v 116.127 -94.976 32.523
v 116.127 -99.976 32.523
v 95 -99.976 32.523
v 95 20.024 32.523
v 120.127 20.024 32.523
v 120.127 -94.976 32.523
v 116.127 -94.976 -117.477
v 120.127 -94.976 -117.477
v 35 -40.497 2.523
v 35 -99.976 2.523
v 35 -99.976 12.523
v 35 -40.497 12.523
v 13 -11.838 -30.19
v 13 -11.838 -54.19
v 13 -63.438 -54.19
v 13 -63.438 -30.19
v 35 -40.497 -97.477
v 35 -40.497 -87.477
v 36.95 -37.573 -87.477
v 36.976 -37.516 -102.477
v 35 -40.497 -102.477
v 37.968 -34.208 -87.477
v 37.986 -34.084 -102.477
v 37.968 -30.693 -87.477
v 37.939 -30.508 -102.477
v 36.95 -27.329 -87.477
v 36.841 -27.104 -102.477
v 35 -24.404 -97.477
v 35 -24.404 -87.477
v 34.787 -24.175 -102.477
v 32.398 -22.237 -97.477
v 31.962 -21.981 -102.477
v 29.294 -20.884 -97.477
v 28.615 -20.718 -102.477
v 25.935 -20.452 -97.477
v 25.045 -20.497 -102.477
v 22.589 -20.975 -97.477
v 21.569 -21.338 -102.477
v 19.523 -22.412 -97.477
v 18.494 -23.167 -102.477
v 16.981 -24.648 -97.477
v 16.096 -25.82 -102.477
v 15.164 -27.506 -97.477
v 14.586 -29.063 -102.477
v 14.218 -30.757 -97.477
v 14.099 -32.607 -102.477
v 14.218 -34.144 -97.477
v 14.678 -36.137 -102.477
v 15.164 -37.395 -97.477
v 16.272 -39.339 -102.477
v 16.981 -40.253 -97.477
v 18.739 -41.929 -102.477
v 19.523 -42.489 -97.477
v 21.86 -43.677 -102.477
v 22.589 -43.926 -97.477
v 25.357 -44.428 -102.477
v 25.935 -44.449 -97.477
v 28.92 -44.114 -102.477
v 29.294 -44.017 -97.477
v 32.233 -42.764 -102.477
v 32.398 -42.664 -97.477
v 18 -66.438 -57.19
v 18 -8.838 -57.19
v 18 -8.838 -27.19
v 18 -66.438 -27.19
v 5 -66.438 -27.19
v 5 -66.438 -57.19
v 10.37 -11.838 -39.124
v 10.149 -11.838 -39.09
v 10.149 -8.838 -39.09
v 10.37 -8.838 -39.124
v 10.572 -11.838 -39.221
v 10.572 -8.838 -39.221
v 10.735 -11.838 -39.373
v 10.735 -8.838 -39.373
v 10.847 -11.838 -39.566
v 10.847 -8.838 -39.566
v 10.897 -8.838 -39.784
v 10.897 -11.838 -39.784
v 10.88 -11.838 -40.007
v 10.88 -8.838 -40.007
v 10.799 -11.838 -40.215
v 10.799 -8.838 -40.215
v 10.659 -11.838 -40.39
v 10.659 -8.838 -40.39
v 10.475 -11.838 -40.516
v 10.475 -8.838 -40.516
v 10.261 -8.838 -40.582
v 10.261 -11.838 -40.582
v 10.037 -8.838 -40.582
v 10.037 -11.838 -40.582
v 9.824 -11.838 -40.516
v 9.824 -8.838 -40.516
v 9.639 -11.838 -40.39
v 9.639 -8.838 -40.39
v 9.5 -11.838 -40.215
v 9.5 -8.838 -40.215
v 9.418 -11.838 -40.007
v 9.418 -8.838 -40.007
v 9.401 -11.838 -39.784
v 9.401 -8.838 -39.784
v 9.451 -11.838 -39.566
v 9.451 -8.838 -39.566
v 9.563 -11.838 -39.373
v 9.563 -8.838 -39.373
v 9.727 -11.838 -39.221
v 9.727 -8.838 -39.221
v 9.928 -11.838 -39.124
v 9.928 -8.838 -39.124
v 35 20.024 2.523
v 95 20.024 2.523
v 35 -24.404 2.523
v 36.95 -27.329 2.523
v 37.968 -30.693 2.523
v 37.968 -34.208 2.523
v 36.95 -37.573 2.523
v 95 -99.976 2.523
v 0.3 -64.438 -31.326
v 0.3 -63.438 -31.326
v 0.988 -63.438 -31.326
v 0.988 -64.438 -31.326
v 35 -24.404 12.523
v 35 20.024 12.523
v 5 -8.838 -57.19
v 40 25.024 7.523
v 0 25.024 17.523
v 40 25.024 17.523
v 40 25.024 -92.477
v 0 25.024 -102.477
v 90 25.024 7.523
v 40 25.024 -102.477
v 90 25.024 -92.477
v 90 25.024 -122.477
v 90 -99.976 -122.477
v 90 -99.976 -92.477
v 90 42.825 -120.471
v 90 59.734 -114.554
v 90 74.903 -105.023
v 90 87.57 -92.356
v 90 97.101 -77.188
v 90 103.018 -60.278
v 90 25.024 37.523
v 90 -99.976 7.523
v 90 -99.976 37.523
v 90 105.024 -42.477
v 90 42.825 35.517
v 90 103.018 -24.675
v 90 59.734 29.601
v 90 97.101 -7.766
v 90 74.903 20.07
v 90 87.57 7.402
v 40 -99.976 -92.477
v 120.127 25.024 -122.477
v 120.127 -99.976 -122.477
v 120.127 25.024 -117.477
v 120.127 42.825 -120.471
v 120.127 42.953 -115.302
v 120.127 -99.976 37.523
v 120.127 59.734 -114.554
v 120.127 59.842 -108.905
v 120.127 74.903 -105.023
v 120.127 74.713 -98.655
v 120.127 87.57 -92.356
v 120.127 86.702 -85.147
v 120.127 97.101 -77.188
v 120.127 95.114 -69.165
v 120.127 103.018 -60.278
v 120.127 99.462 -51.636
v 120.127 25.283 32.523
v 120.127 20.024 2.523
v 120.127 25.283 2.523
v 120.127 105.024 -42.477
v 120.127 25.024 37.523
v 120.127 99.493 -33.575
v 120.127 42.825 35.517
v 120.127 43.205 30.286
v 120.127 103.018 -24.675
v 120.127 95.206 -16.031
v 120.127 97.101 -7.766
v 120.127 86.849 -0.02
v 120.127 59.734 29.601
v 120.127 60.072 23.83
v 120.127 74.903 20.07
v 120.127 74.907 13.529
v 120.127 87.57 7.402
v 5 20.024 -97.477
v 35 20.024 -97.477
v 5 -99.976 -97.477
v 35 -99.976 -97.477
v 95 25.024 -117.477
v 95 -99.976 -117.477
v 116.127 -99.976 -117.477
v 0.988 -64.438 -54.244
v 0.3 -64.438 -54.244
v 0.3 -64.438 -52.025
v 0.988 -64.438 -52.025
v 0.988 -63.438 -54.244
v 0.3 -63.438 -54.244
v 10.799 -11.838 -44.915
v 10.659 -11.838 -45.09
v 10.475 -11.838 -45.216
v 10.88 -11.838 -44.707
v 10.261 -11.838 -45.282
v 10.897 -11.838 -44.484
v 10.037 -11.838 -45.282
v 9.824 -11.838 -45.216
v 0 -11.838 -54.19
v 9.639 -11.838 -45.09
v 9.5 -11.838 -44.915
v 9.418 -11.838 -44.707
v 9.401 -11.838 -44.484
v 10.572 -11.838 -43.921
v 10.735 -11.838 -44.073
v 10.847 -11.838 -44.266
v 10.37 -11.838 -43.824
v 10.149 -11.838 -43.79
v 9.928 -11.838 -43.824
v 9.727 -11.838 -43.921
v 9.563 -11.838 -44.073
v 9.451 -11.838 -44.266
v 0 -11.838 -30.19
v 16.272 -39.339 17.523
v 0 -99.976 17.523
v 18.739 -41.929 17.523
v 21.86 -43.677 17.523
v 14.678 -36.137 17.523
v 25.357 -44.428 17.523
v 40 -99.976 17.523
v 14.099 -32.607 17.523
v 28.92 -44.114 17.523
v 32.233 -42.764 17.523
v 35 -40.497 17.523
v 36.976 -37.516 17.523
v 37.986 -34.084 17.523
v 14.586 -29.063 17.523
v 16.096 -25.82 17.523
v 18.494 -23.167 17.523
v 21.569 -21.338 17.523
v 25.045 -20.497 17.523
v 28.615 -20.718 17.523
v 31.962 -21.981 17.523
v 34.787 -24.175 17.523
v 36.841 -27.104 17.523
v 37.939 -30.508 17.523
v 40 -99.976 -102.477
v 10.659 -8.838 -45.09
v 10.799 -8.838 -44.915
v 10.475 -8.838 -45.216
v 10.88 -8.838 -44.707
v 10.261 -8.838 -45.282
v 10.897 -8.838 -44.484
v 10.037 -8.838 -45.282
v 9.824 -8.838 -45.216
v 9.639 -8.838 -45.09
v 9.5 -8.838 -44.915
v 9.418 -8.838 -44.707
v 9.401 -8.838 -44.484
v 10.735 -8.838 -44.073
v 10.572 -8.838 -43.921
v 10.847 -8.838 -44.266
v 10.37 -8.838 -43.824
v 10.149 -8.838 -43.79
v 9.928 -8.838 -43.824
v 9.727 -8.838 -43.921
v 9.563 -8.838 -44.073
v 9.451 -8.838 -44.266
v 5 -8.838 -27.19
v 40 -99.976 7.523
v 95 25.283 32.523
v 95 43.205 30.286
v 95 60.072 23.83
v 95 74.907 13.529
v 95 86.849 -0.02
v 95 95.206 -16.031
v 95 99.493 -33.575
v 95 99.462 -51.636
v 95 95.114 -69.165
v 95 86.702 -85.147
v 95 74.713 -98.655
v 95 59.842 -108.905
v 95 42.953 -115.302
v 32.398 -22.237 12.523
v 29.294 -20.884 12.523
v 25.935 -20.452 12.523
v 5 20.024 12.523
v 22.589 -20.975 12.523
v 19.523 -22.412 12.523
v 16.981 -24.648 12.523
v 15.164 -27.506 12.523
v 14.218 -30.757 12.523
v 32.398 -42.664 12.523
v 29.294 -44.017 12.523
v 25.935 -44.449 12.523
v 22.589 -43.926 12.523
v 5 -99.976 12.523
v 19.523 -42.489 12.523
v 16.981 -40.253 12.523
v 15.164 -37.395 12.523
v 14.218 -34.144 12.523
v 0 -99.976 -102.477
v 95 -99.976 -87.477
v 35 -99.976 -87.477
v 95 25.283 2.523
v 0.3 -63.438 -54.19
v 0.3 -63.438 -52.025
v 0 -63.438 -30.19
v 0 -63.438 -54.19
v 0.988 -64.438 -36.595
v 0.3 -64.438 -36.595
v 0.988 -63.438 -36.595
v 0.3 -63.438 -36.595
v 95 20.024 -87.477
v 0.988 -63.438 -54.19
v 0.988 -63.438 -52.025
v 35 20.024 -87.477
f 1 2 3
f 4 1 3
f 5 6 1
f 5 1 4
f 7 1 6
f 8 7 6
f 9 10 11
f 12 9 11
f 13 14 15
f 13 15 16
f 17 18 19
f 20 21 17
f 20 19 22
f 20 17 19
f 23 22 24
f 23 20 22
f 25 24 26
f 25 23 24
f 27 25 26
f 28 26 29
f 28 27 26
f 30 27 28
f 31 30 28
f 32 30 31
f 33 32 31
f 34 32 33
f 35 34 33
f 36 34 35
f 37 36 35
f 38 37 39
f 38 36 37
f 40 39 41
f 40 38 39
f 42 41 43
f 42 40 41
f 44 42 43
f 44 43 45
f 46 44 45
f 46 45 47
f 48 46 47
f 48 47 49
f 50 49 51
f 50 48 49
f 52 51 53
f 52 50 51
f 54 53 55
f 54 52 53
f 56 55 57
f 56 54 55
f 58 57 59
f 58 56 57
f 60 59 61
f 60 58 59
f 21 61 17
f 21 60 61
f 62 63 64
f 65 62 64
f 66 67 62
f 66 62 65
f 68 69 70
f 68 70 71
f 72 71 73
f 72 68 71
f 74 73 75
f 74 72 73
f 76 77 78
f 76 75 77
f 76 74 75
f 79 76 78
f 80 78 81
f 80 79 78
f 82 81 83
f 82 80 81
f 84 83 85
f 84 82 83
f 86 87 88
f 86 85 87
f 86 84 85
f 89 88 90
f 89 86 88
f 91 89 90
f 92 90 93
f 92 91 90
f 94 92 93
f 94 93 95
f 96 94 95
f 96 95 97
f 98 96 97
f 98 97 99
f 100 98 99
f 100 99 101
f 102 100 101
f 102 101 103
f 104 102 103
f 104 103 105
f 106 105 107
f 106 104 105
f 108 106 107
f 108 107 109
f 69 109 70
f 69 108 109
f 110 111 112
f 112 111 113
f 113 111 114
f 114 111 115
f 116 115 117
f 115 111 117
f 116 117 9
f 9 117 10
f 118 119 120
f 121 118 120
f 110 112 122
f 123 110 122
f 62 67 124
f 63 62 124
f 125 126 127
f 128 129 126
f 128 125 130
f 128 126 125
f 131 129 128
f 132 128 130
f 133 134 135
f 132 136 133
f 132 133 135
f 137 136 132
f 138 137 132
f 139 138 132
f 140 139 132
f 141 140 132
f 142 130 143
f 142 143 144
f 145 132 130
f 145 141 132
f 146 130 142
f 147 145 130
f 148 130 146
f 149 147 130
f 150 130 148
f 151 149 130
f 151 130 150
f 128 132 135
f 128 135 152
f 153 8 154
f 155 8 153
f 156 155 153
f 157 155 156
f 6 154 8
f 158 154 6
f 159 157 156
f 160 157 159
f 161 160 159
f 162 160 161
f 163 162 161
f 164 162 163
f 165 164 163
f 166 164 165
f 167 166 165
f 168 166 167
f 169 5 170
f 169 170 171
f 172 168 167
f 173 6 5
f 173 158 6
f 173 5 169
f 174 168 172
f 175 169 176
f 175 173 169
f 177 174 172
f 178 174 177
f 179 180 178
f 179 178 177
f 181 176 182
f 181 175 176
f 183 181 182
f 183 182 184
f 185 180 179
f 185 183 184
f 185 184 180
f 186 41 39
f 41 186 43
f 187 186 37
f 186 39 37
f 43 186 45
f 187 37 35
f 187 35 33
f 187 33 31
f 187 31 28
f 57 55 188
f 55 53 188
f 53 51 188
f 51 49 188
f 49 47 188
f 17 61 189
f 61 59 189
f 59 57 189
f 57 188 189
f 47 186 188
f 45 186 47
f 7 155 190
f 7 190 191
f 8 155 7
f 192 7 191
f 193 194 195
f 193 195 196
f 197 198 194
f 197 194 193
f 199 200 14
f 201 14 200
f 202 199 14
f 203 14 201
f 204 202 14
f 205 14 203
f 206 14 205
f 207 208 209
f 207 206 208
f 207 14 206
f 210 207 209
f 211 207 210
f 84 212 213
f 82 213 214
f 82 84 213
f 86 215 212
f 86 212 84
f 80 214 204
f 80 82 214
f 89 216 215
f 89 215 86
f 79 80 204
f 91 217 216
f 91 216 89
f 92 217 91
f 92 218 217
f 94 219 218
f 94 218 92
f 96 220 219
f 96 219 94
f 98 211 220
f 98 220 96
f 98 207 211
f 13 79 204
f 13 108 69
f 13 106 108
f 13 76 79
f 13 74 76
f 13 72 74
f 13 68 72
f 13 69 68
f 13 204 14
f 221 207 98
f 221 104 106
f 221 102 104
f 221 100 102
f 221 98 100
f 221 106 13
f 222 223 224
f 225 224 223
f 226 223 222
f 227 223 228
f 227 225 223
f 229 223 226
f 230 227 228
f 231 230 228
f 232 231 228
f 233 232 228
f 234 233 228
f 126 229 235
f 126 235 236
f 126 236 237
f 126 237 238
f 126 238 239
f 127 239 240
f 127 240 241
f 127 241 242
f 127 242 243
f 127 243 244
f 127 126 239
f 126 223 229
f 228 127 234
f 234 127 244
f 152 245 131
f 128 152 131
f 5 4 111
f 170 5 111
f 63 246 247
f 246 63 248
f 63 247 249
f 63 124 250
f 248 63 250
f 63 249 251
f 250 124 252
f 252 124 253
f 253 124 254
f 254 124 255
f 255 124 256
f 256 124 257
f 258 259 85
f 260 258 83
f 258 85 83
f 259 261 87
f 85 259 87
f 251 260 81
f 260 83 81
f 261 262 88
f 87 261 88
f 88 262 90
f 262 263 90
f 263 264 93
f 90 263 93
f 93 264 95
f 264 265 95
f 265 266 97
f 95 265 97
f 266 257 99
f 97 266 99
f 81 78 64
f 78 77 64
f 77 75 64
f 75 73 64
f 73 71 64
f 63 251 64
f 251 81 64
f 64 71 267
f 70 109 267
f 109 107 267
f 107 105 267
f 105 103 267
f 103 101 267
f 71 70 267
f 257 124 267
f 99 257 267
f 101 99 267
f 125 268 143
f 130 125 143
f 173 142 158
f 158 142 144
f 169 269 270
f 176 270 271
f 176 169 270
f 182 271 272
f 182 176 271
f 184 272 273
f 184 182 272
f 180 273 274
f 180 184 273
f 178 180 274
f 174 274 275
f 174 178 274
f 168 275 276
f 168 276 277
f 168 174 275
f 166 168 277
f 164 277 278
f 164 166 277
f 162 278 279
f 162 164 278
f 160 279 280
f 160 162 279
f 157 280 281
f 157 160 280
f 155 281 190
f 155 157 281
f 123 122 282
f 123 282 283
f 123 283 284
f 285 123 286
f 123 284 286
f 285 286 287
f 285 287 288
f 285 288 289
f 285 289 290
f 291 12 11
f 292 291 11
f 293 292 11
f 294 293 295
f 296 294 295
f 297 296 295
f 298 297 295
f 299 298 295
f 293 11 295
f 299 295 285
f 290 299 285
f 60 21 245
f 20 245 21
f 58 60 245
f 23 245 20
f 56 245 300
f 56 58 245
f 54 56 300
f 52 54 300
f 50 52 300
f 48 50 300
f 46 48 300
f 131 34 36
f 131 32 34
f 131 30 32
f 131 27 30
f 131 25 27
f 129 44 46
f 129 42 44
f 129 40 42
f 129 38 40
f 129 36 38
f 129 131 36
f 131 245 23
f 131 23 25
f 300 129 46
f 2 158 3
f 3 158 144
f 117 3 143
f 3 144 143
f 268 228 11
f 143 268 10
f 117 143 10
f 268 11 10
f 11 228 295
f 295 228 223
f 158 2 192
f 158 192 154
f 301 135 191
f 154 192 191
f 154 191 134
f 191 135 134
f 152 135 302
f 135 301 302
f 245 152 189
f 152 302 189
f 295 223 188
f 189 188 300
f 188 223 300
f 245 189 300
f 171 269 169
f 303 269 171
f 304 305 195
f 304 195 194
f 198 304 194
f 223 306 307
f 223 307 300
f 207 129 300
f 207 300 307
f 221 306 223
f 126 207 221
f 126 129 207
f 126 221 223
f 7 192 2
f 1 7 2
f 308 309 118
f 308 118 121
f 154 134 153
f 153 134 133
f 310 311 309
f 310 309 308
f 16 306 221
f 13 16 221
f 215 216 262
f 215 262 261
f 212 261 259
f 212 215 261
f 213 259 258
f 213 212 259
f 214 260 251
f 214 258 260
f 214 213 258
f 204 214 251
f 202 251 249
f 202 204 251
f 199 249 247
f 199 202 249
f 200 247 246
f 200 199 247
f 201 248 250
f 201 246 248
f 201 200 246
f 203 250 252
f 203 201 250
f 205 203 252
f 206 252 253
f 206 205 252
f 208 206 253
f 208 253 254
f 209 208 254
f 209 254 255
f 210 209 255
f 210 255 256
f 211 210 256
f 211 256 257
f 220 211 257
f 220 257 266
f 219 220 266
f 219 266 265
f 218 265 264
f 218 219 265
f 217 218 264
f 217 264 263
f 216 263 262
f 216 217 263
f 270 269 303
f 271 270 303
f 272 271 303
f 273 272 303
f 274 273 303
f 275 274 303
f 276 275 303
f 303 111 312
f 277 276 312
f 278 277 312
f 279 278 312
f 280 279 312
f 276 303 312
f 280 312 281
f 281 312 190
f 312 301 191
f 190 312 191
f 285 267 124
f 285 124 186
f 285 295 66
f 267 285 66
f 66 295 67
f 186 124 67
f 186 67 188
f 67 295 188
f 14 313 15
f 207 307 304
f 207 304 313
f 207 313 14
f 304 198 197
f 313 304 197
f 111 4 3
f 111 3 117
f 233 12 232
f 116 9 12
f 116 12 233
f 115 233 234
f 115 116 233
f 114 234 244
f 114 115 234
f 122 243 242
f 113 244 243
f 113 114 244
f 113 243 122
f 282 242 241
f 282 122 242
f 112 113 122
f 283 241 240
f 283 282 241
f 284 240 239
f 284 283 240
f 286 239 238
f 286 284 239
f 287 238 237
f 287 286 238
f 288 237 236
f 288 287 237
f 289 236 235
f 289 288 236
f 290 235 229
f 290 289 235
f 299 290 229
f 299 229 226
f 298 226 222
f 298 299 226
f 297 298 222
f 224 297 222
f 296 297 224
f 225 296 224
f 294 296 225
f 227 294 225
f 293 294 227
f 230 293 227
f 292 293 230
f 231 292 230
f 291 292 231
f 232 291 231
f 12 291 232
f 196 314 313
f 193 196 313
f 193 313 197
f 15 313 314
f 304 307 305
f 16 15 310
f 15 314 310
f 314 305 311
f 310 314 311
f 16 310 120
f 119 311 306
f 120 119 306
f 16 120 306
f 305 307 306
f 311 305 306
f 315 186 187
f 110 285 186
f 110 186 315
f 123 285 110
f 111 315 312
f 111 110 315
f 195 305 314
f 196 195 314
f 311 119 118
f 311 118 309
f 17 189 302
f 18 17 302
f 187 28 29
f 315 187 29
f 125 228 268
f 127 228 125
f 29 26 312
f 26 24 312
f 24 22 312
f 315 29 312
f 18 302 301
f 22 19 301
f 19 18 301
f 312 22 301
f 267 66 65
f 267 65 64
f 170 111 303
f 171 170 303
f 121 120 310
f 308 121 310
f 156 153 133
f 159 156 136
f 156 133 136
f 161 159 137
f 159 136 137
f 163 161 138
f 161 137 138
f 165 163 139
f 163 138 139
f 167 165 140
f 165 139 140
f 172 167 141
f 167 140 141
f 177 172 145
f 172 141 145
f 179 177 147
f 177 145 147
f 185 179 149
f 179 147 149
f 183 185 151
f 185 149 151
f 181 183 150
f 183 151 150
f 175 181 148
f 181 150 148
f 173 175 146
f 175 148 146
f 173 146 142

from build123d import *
from OCP.BRepAlgoAPI import BRepAlgoAPI_Cut
from OCP.TopTools import TopTools_ListOfShape

# Parameters (mm, degrees)
BOSS_EXTRUDE2_DEPTH          = 150
SKETCH4_W                    = 40
SKETCH4_H                    = 124.999999274
CUT_EXTRUDE4_DEPTH           = 20
SKETCH8_W                    = 50
SKETCH8_H                    = 124.997967802
CUT_EXTRUDE8_DEPTH           = 30
CUT_EXTRUDE10_DEPTH          = 231.489840965
CUT_EXTRUDE10_DEPTH_BACK     = 231.489840965
CUT_EXTRUDE11_DEPTH          = 225.566109405
CUT_EXTRUDE11_DEPTH_BACK     = 225.566109405
SKETCH11_W                   = 112.022201576
SKETCH11_H                   = 106.194456985
CUT_EXTRUDE12_DEPTH          = 55
SKETCH13_W                   = 40
SKETCH13_H                   = 124.999999274
CUT_EXTRUDE13_DEPTH          = 20
SKETCH14_W                   = 50
SKETCH14_H                   = 124.999999274
CUT_EXTRUDE15_DEPTH          = 30
CUT_EXTRUDE17_DEPTH          = 120
SKETCH17_W                   = 30
SKETCH17_H                   = 5.259472701
BOSS_EXTRUDE3_DEPTH          = 55
CUT_EXTRUDE18_DEPTH          = 225.566109405
CUT_EXTRUDE18_DEPTH_BACK     = 225.566109405
SKETCH20_R                   = 12
CUT_EXTRUDE_THIN2_DEPTH      = 244.166481024
CUT_EXTRUDE_THIN2_DEPTH_BACK = 244.166481024
SKETCH21_W                   = 50
SKETCH21_H                   = 219.250605911
SKETCH22_W                   = 4
SKETCH22_H                   = 160
BOSS_EXTRUDE4_DEPTH          = 5
SKETCH25_W                   = 30
SKETCH25_H                   = 57.6
BOSS_EXTRUDE5_DEPTH          = 18
SKETCH25_4_W                 = 24
SKETCH25_4_H                 = 51.6
CUT_EXTRUDE19_DEPTH          = 13
SKETCH26_W                   = 0.687822724
SKETCH26_H                   = 5.268229282
SKETCH26_H_2                 = 2.219145295
CUT_EXTRUDE21_DEPTH          = 1
CUT_EXTRUDE22_DEPTH          = 5
CUT_EXTRUDE22_DEPTH_BACK     = 5
SKETCH28_R                   = 0.75


with BuildPart() as part:
    # Sketch1 → Boss-Extrude2 (new body)
    with BuildSketch(Plane(origin=(0, 0, 0), x_dir=(0, 0, -1), z_dir=(1, 0, 0))):
        with BuildLine():
            Line((-37.52319824, 25.023509242), (-37.52319824, -99.976490758))
            Line((-37.52319824, -99.976490758), (122.47680176, -99.976490758))
            Line((122.47680176, -99.976490758), (122.47680176, 25.023509242))
            ThreePointArc((122.47680176, 25.023509242), (42.47680176, 105.023509242), (-37.52319824, 25.023509242))
        make_face()
    extrude(amount=BOSS_EXTRUDE2_DEPTH)

    # Sketch4 → Cut-Extrude4 (cut)
    with BuildSketch(Plane.XY.offset(37.52319824)):
        with Locations((20, -37.476491121)):
            Rectangle(SKETCH4_W, SKETCH4_H)
    extrude(amount=-CUT_EXTRUDE4_DEPTH, mode=Mode.SUBTRACT)

    # Sketch8 → Cut-Extrude8 (cut)
    with BuildSketch(Plane.XY.offset(37.52319824)):
        with Locations((65, -37.477506857)):
            Rectangle(SKETCH8_W, SKETCH8_H)
    extrude(amount=-CUT_EXTRUDE8_DEPTH, mode=Mode.SUBTRACT)

    # Sketch9 → Cut-Extrude10 (cut, two sides: drawn at the far end of the back side and taken through both)
    with BuildSketch(Plane.XZ.offset(-25.023508516).offset(-CUT_EXTRUDE10_DEPTH_BACK)):
        Polygon((0, 37.52319824), (0, 17.52319824), (40, 17.52319824), (40, 7.52319824), (90, 7.52319824), (90, 37.52319824), align=None)
    extrude(amount=CUT_EXTRUDE10_DEPTH + CUT_EXTRUDE10_DEPTH_BACK, mode=Mode.SUBTRACT)

    # Sketch11 → Cut-Extrude11 (cut, two sides: drawn at the far end of the back side and taken through both)
    with BuildSketch(Plane.XY.offset(7.52319824).offset(-CUT_EXTRUDE11_DEPTH_BACK)):
        with Locations((33.988899212, 78.120737735)):
            Rectangle(SKETCH11_W, SKETCH11_H)
    extrude(amount=CUT_EXTRUDE11_DEPTH + CUT_EXTRUDE11_DEPTH_BACK, mode=Mode.SUBTRACT)

    # Sketch12 → Cut-Extrude12 (cut)
    with BuildSketch(Plane(origin=(150, 0, 0), x_dir=(0, 0, -1), z_dir=(1, 0, 0))):
        with BuildLine():
            ThreePointArc((117.47680176, 25.023509242), (42.47680176, 100.023509242), (-32.52319824, 25.023509242))
            Line((-32.52319824, 25.023509242), (-32.52319824, -94.976490758))
            Line((-32.52319824, -94.976490758), (117.47680176, -94.976490758))
            Line((117.47680176, -94.976490758), (117.47680176, 25.023509242))
        make_face()
    extrude(amount=-CUT_EXTRUDE12_DEPTH, mode=Mode.SUBTRACT)


with BuildPart() as cut_extrude13_tool:
    # Sketch13 → Cut-Extrude13 (new body)
    with BuildSketch(Plane(origin=(0, 0, -122.47680176), x_dir=(-1, 0, 0), z_dir=(0, 0, -1))):
        with Locations((-20, -37.476490395)):
            Rectangle(SKETCH13_W, SKETCH13_H)
    extrude(amount=-CUT_EXTRUDE13_DEPTH)


with BuildPart() as part_1:
    add(part.part)

    # Cut-Extrude13: cut by cut_extrude13_tool, with a tolerance
    cut_extrude13_stock = TopTools_ListOfShape()
    cut_extrude13_stock.Append(part_1.part.wrapped)
    cut_extrude13_tools = TopTools_ListOfShape()
    cut_extrude13_tools.Append(cut_extrude13_tool.part.wrapped)
    cut_extrude13_cut = BRepAlgoAPI_Cut()
    cut_extrude13_cut.SetArguments(cut_extrude13_stock)
    cut_extrude13_cut.SetTools(cut_extrude13_tools)
    cut_extrude13_cut.SetFuzzyValue(0.00001)
    cut_extrude13_cut.Build()
    add(Compound.cast(cut_extrude13_cut.Shape()).solids(), mode=Mode.REPLACE)


with BuildPart() as cut_extrude15_tool:
    # Sketch14 → Cut-Extrude15 (new body)
    with BuildSketch(Plane(origin=(0, 0, -122.47680176), x_dir=(-1, 0, 0), z_dir=(0, 0, -1))):
        with Locations((-65, -37.476490395)):
            Rectangle(SKETCH14_W, SKETCH14_H)
    extrude(amount=-CUT_EXTRUDE15_DEPTH)


with BuildPart() as part_2:
    add(part_1.part)

    # Cut-Extrude15: cut by cut_extrude15_tool, with a tolerance
    cut_extrude15_stock = TopTools_ListOfShape()
    cut_extrude15_stock.Append(part_2.part.wrapped)
    cut_extrude15_tools = TopTools_ListOfShape()
    cut_extrude15_tools.Append(cut_extrude15_tool.part.wrapped)
    cut_extrude15_cut = BRepAlgoAPI_Cut()
    cut_extrude15_cut.SetArguments(cut_extrude15_stock)
    cut_extrude15_cut.SetTools(cut_extrude15_tools)
    cut_extrude15_cut.SetFuzzyValue(0.00001)
    cut_extrude15_cut.Build()
    add(Compound.cast(cut_extrude15_cut.Shape()).solids(), mode=Mode.REPLACE)

    # Sketch16 → Cut-Extrude17 (cut)
    with BuildSketch(Plane.XZ.offset(99.976490758)):
        Polygon((95, -87.47680176), (95, -117.47680176), (145, -117.47680176), (145, 32.52319824), (95, 32.52319824), (95, 2.52319824), (35, 2.52319824), (35, 12.52319824), (5, 12.52319824), (5, -97.47680176), (35, -97.47680176), (35, -87.47680176), align=None)
    extrude(amount=-CUT_EXTRUDE17_DEPTH, mode=Mode.SUBTRACT)

    # Sketch17 → Boss-Extrude3 (add)
    with BuildSketch(Plane(origin=(95, 0, 0), x_dir=(0, 0, -1), z_dir=(1, 0, 0))):
        with Locations((-17.52319824, 22.653245593)):
            Rectangle(SKETCH17_W, SKETCH17_H)
    extrude(amount=BOSS_EXTRUDE3_DEPTH)

    # Sketch20 → Cut-Extrude18 (cut, two sides: drawn at the far end of the back side and taken through both)
    with BuildSketch(Plane.XY.offset(7.52319824).offset(-CUT_EXTRUDE18_DEPTH_BACK)):
        with Locations((26.097811204, -32.450551048)):
            Circle(SKETCH20_R)
    extrude(amount=CUT_EXTRUDE18_DEPTH + CUT_EXTRUDE18_DEPTH_BACK, mode=Mode.SUBTRACT)

    # Sketch21 → Cut-Extrude-Thin2 (cut, two sides: drawn at the far end of the back side and taken through both)
    with BuildSketch(Plane(origin=(0, 0, -122.47680176), x_dir=(-1, 0, 0), z_dir=(0, 0, -1)).offset(-CUT_EXTRUDE_THIN2_DEPTH_BACK)):
        with Locations((-145.127265144, 6.610737582)):
            Rectangle(SKETCH21_W, SKETCH21_H)
    extrude(amount=CUT_EXTRUDE_THIN2_DEPTH + CUT_EXTRUDE_THIN2_DEPTH_BACK, mode=Mode.SUBTRACT)

    # Sketch22 → Boss-Extrude4 (add)
    with BuildSketch(Plane.XZ.offset(99.976490758)):
        with Locations((118.127265144, -42.47680176)):
            Rectangle(SKETCH22_W, SKETCH22_H)
    extrude(amount=-BOSS_EXTRUDE4_DEPTH)

    # Sketch25 → Boss-Extrude5 (add)
    with BuildSketch(Plane.ZY):
        with Locations((-42.190239987, -37.637506258)):
            Rectangle(SKETCH25_W, SKETCH25_H)
    extrude(amount=-BOSS_EXTRUDE5_DEPTH)

    # Sketch25<4> → Cut-Extrude19 (cut)
    with BuildSketch(Plane.ZY):
        with Locations((-42.190239987, -37.637506258)):
            Rectangle(SKETCH25_4_W, SKETCH25_4_H)
    extrude(amount=-CUT_EXTRUDE19_DEPTH, mode=Mode.SUBTRACT)

    # Sketch26 → Cut-Extrude21 (cut)
    with BuildSketch(Plane(origin=(0, -63.437506258, 0), x_dir=(1, 0, 0), z_dir=(0, 1, 0))):
        with Locations((0.643930004, 33.960425166)):
            Rectangle(SKETCH26_W, SKETCH26_H)
        with Locations((0.643930004, 53.134905876)):
            Rectangle(SKETCH26_W, SKETCH26_H_2)
    extrude(amount=-CUT_EXTRUDE21_DEPTH, mode=Mode.SUBTRACT)

    # Sketch28 → Cut-Extrude22 (cut, two sides: drawn at the far end of the back side and taken through both)
    with BuildSketch(Plane(origin=(0, -8.837506258, 0), x_dir=(1, 0, 0), z_dir=(0, 1, 0)).offset(-CUT_EXTRUDE22_DEPTH_BACK)):
        with Locations((10.149113082, 44.540239987)):
            Circle(SKETCH28_R)
        with Locations((10.149113082, 39.840239987)):
            Circle(SKETCH28_R)
    extrude(amount=CUT_EXTRUDE22_DEPTH + CUT_EXTRUDE22_DEPTH_BACK, mode=Mode.SUBTRACT)


solid = part_2.part
